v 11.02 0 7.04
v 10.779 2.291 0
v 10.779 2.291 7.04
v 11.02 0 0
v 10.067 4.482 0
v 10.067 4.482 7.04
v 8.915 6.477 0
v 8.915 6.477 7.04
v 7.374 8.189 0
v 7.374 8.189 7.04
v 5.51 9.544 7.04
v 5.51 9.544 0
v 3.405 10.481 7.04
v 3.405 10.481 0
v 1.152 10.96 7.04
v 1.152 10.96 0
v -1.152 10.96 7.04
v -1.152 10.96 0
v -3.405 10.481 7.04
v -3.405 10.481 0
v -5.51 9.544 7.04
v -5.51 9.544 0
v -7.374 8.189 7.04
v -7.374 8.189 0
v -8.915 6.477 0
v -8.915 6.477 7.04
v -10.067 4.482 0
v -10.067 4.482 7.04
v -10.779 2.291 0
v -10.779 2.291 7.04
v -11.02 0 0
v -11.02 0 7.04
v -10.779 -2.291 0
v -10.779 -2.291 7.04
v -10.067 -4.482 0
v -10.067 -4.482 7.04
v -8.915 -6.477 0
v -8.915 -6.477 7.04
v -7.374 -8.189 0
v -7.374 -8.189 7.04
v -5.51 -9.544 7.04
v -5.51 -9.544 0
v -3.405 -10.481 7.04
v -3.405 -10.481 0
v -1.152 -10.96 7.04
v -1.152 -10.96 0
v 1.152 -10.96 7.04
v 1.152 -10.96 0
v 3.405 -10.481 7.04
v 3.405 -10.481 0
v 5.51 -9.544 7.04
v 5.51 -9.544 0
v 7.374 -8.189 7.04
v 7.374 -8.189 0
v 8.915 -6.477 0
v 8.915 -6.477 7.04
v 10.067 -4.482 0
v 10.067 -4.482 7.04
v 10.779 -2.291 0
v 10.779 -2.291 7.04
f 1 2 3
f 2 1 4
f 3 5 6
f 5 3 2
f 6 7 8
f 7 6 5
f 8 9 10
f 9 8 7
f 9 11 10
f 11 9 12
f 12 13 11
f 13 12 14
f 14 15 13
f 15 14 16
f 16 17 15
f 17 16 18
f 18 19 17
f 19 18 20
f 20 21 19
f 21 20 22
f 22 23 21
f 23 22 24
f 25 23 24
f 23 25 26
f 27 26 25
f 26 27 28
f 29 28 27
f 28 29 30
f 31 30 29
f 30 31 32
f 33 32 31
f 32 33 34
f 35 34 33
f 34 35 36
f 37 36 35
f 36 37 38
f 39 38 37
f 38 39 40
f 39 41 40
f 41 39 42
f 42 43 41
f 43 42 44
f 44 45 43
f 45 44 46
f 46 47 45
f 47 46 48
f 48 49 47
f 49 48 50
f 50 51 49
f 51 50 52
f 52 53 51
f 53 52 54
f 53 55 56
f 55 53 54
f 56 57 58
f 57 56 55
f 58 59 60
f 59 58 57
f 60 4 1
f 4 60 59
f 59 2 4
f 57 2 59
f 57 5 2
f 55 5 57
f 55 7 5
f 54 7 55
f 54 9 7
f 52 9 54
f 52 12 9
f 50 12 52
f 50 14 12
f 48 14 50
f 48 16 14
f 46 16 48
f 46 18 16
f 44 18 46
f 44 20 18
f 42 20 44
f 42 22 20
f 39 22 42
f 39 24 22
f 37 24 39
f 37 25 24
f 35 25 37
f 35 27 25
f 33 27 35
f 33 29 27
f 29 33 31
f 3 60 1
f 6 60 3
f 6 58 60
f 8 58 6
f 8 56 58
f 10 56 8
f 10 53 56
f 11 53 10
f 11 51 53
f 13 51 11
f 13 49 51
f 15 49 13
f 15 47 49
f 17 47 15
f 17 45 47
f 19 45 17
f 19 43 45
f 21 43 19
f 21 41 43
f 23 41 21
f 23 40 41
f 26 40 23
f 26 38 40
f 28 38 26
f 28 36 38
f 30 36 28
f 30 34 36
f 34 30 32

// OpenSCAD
// file: LinearBearing.scad
use <../Parameters.scad>

function LinearBearingDiam() = 15 + 3dPrinterTolerance();
function LinearBearingInnerDiam() = 8.3 + 3dPrinterTolerance();
function LinearBearingHeight() = 24 + 3dPrinterTolerance();

module LinearBearing()
{
cylinder(LinearBearingHeight(), LinearBearingDiam()/2, LinearBearingDiam()/2, 0);
}


LinearBearing();
// file: Zrod.scad
use <../Parameters.scad>

function ZrodLength()=1000;
function ZrodDiameter()=8 + 3dPrinterTolerance()*2;  //base case: 8
function ZrodRadius()=ZrodDiameter()/2;

module Zrod()
{
color("Silver")
cylinder(ZrodLength(), ZrodRadius(), ZrodRadius());
}

Zrod();
// file: ../Parameters.scad
use<Vitamins/Zrod.scad>
use<Vitamins/LinearBearing.scad>

function mm(i) = i*25.4; 

//Build dimensions (x,y,z)-- x, y and z of printable area, NOT of overall device

//z-rod length, diameter-- dependent on which rods you buy
//(bearing diameter is dependent on rod diameter)


function ZBearingSpacing()= 105;
function ZrodSpacing()=ZBearingSpacing()-LinearBearingDiam()*2-PlasticWidth()*4;


//parametric of which hotend is being used (printerbot or bucha nozzle)

//stepper vs servo

//3 parameters (1 for each link) horizontal vs vertical

//paper is a parametric vitamin

//distance between link arms will be calculable based on radius of toolplate





//tolerances
function LaserCutTolerance() = .02;
function 3dPrinterTolerance() = .04;




//the equation used for plastic width, it can of course be changed
function PlasticWidth()= (ZrodDiameter()/2);
function SideWidth() = (ZrodDiameter()+PlasticWidth());
// main file
use <../Parameters.scad>

function BallBearingDiam() = 22 + 3dPrinterTolerance(); //USUALLY 22
function BallBearingHeight() = 7 + 3dPrinterTolerance(); //USUALLY 7
function BallBearingInnerDiam()= 8 + 3dPrinterTolerance(); //USUALLY 8

module BallBearing()
{
cylinder(BallBearingHeight(), BallBearingDiam()/2, BallBearingDiam()/2);
}


BallBearing();
